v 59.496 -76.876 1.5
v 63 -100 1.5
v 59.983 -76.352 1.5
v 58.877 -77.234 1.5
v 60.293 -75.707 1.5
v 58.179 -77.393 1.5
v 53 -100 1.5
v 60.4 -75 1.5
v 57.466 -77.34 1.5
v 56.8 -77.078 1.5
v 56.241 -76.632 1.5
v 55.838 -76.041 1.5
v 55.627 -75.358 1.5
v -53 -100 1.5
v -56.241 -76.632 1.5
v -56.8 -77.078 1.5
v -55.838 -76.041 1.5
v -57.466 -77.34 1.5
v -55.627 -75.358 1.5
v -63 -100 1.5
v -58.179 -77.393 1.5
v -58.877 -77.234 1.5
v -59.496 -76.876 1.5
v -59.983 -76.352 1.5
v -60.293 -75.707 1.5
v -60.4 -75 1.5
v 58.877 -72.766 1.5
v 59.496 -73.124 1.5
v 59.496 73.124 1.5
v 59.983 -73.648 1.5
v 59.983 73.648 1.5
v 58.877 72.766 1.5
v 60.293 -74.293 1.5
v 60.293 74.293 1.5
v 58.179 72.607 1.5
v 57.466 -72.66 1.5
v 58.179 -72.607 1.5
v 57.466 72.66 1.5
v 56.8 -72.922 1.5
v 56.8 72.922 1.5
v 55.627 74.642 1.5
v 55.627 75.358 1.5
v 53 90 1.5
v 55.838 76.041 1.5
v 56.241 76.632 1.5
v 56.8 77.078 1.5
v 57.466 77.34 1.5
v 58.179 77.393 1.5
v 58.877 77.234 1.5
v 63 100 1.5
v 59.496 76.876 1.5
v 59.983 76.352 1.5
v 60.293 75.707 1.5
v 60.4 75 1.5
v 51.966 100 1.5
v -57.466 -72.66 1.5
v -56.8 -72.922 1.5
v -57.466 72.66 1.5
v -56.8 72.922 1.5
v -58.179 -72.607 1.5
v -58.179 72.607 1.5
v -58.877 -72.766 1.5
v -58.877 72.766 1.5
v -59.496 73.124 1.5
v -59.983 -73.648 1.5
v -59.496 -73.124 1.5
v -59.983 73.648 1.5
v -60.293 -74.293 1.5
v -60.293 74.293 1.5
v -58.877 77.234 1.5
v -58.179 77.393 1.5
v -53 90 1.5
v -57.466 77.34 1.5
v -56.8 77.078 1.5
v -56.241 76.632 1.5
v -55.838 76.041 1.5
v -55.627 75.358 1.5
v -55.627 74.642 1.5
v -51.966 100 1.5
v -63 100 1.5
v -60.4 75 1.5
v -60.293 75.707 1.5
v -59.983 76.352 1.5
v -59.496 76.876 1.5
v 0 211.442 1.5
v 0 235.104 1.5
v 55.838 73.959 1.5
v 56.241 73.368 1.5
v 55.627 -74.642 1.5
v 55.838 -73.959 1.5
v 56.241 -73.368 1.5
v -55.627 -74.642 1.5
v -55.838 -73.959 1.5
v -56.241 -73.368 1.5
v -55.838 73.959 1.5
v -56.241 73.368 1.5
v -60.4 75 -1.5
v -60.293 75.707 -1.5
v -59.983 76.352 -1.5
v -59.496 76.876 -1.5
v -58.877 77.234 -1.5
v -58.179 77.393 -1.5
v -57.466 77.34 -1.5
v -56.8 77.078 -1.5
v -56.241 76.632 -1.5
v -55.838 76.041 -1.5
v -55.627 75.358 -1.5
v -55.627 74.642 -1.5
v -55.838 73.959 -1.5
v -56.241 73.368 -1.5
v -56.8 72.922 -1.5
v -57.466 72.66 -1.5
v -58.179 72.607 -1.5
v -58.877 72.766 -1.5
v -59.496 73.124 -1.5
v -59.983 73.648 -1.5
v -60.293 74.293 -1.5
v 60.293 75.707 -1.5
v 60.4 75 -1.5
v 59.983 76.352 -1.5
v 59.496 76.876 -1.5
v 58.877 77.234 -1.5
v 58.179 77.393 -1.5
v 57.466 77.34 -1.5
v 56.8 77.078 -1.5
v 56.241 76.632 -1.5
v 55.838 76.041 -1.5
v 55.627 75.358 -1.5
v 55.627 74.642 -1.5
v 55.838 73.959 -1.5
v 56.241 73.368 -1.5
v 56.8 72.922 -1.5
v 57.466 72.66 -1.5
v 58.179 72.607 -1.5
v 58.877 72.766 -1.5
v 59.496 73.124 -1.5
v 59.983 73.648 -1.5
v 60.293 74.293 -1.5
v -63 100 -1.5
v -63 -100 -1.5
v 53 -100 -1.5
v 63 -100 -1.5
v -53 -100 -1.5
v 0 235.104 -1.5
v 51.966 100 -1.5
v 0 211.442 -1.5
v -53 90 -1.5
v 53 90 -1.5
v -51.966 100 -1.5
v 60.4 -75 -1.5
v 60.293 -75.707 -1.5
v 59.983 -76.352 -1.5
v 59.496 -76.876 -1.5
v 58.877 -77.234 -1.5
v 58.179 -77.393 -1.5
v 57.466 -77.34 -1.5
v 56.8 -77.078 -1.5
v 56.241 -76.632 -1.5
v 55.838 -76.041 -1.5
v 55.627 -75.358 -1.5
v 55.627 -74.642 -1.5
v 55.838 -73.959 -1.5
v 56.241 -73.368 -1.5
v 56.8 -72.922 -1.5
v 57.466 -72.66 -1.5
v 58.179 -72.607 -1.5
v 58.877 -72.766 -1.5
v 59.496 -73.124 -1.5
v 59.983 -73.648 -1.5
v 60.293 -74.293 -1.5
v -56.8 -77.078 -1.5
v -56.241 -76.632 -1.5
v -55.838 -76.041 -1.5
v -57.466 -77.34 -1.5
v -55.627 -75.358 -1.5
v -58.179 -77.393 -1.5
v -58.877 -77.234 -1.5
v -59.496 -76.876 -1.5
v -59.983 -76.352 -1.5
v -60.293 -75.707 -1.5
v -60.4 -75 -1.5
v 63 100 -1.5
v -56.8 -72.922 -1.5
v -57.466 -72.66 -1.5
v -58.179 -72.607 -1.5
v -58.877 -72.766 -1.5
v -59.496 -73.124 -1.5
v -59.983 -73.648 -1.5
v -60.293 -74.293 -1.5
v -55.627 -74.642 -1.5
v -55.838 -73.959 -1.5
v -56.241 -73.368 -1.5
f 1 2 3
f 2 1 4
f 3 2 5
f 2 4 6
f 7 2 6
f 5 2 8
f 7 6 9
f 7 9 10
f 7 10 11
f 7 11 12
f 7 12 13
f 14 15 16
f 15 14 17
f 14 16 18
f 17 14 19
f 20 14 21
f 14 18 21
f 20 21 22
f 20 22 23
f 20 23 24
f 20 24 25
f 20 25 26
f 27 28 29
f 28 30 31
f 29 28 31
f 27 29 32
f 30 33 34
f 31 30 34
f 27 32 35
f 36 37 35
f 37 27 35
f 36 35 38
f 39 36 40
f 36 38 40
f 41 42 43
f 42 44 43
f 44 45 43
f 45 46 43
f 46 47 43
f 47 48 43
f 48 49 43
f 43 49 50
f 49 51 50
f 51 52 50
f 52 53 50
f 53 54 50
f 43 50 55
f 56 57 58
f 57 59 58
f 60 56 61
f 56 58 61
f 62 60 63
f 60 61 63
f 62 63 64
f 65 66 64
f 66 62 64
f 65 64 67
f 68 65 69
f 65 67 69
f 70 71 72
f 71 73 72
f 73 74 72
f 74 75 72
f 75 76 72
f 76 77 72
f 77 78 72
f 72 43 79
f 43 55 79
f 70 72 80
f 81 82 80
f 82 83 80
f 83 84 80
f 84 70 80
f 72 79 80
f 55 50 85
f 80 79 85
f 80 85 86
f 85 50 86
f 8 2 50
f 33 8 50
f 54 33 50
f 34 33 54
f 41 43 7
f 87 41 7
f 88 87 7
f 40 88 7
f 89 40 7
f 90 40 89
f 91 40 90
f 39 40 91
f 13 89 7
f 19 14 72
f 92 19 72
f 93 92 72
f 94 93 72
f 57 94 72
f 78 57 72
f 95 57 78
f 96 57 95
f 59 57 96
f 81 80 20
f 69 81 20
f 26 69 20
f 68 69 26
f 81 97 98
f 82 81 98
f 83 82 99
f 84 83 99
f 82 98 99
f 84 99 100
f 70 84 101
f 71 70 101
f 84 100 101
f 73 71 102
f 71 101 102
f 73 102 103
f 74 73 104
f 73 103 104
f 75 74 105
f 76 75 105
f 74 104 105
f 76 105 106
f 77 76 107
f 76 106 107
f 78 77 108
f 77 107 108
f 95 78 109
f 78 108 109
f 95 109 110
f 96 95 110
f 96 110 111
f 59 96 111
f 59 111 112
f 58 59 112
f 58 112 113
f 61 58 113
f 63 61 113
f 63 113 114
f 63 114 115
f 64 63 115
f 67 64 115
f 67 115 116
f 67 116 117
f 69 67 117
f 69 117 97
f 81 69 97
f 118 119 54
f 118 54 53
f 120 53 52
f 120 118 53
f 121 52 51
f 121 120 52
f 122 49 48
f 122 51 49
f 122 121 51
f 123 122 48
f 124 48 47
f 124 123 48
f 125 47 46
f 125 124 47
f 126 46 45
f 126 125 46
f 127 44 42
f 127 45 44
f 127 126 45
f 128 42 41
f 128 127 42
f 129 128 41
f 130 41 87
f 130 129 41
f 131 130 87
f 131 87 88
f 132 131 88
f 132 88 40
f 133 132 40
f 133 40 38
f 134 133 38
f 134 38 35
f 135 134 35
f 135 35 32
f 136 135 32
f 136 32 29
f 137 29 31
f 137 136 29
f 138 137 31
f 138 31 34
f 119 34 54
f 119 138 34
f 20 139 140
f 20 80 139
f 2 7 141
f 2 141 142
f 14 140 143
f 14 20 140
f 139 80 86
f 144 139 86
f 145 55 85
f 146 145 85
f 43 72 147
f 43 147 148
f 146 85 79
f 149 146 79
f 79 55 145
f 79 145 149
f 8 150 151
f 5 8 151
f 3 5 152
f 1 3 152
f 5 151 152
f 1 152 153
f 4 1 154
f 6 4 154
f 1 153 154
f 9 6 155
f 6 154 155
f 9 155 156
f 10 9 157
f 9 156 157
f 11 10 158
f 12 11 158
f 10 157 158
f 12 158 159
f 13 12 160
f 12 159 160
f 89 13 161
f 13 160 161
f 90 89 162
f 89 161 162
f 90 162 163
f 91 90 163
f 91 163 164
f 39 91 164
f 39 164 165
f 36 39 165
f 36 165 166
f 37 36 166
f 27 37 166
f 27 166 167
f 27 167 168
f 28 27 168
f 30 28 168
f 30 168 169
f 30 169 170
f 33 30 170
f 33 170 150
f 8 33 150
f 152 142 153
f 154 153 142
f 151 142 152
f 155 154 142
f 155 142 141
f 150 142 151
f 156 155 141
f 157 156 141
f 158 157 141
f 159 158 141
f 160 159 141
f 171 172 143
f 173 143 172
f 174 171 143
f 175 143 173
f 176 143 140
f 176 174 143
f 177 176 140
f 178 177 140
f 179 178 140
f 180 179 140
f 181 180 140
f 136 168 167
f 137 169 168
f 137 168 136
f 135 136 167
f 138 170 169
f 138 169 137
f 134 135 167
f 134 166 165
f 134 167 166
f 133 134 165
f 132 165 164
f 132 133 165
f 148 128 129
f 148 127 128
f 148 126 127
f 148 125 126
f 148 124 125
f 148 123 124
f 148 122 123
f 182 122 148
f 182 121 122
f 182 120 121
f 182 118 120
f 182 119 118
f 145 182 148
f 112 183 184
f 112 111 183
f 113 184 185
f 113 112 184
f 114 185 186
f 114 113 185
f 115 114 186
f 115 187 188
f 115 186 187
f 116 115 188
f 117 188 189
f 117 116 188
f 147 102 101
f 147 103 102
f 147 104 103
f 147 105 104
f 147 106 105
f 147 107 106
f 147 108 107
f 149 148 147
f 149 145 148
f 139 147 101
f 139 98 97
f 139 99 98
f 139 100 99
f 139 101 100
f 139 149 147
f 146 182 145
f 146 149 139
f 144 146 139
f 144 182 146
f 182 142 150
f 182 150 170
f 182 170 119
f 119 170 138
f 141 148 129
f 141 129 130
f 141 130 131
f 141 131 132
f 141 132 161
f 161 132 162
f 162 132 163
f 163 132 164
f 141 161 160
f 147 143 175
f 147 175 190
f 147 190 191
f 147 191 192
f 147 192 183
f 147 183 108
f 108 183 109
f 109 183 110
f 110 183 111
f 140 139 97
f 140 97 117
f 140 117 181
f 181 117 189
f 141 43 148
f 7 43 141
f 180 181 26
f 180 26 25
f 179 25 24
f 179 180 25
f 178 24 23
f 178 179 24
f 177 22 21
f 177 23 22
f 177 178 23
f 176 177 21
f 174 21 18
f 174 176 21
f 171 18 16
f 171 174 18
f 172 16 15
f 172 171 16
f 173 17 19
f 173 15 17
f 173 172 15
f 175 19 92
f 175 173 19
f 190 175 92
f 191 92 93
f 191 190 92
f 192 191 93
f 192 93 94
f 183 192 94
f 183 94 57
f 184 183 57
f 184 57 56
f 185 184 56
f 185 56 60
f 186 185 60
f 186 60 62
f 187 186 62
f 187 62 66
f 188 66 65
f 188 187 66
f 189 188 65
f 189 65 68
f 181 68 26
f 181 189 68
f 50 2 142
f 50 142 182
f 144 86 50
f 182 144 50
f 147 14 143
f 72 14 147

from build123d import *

# Parameters (mm, degrees)
RECTANGLE_RIB_DEPTH                  = 1.5
TRIANGLE_RIB_DEPTH                   = 3
M4_CLEARANCE_HOLE1_D                 = 4.8
MIRROR1_AT_THE_SECOND_PLANE_COPY_1_D = 4.8


with BuildPart() as part:
    # Sketch1 → Rectangle Rib (new, symmetric)
    with BuildSketch(Plane.XY):
        Polygon((-63, -100), (-53, -100), (-53, -90), (-53, 90), (53, 90), (53, -90), (53, -100), (63, -100), (63, 100), (-63, 100), align=None)
    extrude(amount=RECTANGLE_RIB_DEPTH, both=True)

    # Sketch2 → Triangle Rib (add)
    with BuildSketch(Plane.XY.offset(1.5)):
        Polygon((-63, 100), (0, 235.103935992), (63, 100), (51.96622081, 100), (0, 211.441920161), (-51.96622081, 100), align=None)
    extrude(amount=-TRIANGLE_RIB_DEPTH)

    # M4 Clearance Hole1 (through all)
    with Locations(Plane.XY.offset(1.5)):
        with Locations((-58, 75)):
            m4_clearance_hole1 = Hole(M4_CLEARANCE_HOLE1_D / 2)

    # Mirror1: M4 Clearance Hole1 across plane
    add(m4_clearance_hole1.mirror(Plane.ZX), mode=Mode.SUBTRACT)

    # Mirror1 at the second plane: M4 Clearance Hole1 across plane
    add(m4_clearance_hole1.mirror(Plane(origin=(0, 0, 0), x_dir=(0, 0, 1), z_dir=(1, 0, 0))), mode=Mode.SUBTRACT)

    # Mirror1 at the second plane copy 1 (through all)
    with Locations(Plane(origin=(0, 0, 1.5), x_dir=(-1, 0, 0), z_dir=(0, 0, 1))):
        with Locations((-58, 75)):
            Hole(MIRROR1_AT_THE_SECOND_PLANE_COPY_1_D / 2)


solid = part.part
